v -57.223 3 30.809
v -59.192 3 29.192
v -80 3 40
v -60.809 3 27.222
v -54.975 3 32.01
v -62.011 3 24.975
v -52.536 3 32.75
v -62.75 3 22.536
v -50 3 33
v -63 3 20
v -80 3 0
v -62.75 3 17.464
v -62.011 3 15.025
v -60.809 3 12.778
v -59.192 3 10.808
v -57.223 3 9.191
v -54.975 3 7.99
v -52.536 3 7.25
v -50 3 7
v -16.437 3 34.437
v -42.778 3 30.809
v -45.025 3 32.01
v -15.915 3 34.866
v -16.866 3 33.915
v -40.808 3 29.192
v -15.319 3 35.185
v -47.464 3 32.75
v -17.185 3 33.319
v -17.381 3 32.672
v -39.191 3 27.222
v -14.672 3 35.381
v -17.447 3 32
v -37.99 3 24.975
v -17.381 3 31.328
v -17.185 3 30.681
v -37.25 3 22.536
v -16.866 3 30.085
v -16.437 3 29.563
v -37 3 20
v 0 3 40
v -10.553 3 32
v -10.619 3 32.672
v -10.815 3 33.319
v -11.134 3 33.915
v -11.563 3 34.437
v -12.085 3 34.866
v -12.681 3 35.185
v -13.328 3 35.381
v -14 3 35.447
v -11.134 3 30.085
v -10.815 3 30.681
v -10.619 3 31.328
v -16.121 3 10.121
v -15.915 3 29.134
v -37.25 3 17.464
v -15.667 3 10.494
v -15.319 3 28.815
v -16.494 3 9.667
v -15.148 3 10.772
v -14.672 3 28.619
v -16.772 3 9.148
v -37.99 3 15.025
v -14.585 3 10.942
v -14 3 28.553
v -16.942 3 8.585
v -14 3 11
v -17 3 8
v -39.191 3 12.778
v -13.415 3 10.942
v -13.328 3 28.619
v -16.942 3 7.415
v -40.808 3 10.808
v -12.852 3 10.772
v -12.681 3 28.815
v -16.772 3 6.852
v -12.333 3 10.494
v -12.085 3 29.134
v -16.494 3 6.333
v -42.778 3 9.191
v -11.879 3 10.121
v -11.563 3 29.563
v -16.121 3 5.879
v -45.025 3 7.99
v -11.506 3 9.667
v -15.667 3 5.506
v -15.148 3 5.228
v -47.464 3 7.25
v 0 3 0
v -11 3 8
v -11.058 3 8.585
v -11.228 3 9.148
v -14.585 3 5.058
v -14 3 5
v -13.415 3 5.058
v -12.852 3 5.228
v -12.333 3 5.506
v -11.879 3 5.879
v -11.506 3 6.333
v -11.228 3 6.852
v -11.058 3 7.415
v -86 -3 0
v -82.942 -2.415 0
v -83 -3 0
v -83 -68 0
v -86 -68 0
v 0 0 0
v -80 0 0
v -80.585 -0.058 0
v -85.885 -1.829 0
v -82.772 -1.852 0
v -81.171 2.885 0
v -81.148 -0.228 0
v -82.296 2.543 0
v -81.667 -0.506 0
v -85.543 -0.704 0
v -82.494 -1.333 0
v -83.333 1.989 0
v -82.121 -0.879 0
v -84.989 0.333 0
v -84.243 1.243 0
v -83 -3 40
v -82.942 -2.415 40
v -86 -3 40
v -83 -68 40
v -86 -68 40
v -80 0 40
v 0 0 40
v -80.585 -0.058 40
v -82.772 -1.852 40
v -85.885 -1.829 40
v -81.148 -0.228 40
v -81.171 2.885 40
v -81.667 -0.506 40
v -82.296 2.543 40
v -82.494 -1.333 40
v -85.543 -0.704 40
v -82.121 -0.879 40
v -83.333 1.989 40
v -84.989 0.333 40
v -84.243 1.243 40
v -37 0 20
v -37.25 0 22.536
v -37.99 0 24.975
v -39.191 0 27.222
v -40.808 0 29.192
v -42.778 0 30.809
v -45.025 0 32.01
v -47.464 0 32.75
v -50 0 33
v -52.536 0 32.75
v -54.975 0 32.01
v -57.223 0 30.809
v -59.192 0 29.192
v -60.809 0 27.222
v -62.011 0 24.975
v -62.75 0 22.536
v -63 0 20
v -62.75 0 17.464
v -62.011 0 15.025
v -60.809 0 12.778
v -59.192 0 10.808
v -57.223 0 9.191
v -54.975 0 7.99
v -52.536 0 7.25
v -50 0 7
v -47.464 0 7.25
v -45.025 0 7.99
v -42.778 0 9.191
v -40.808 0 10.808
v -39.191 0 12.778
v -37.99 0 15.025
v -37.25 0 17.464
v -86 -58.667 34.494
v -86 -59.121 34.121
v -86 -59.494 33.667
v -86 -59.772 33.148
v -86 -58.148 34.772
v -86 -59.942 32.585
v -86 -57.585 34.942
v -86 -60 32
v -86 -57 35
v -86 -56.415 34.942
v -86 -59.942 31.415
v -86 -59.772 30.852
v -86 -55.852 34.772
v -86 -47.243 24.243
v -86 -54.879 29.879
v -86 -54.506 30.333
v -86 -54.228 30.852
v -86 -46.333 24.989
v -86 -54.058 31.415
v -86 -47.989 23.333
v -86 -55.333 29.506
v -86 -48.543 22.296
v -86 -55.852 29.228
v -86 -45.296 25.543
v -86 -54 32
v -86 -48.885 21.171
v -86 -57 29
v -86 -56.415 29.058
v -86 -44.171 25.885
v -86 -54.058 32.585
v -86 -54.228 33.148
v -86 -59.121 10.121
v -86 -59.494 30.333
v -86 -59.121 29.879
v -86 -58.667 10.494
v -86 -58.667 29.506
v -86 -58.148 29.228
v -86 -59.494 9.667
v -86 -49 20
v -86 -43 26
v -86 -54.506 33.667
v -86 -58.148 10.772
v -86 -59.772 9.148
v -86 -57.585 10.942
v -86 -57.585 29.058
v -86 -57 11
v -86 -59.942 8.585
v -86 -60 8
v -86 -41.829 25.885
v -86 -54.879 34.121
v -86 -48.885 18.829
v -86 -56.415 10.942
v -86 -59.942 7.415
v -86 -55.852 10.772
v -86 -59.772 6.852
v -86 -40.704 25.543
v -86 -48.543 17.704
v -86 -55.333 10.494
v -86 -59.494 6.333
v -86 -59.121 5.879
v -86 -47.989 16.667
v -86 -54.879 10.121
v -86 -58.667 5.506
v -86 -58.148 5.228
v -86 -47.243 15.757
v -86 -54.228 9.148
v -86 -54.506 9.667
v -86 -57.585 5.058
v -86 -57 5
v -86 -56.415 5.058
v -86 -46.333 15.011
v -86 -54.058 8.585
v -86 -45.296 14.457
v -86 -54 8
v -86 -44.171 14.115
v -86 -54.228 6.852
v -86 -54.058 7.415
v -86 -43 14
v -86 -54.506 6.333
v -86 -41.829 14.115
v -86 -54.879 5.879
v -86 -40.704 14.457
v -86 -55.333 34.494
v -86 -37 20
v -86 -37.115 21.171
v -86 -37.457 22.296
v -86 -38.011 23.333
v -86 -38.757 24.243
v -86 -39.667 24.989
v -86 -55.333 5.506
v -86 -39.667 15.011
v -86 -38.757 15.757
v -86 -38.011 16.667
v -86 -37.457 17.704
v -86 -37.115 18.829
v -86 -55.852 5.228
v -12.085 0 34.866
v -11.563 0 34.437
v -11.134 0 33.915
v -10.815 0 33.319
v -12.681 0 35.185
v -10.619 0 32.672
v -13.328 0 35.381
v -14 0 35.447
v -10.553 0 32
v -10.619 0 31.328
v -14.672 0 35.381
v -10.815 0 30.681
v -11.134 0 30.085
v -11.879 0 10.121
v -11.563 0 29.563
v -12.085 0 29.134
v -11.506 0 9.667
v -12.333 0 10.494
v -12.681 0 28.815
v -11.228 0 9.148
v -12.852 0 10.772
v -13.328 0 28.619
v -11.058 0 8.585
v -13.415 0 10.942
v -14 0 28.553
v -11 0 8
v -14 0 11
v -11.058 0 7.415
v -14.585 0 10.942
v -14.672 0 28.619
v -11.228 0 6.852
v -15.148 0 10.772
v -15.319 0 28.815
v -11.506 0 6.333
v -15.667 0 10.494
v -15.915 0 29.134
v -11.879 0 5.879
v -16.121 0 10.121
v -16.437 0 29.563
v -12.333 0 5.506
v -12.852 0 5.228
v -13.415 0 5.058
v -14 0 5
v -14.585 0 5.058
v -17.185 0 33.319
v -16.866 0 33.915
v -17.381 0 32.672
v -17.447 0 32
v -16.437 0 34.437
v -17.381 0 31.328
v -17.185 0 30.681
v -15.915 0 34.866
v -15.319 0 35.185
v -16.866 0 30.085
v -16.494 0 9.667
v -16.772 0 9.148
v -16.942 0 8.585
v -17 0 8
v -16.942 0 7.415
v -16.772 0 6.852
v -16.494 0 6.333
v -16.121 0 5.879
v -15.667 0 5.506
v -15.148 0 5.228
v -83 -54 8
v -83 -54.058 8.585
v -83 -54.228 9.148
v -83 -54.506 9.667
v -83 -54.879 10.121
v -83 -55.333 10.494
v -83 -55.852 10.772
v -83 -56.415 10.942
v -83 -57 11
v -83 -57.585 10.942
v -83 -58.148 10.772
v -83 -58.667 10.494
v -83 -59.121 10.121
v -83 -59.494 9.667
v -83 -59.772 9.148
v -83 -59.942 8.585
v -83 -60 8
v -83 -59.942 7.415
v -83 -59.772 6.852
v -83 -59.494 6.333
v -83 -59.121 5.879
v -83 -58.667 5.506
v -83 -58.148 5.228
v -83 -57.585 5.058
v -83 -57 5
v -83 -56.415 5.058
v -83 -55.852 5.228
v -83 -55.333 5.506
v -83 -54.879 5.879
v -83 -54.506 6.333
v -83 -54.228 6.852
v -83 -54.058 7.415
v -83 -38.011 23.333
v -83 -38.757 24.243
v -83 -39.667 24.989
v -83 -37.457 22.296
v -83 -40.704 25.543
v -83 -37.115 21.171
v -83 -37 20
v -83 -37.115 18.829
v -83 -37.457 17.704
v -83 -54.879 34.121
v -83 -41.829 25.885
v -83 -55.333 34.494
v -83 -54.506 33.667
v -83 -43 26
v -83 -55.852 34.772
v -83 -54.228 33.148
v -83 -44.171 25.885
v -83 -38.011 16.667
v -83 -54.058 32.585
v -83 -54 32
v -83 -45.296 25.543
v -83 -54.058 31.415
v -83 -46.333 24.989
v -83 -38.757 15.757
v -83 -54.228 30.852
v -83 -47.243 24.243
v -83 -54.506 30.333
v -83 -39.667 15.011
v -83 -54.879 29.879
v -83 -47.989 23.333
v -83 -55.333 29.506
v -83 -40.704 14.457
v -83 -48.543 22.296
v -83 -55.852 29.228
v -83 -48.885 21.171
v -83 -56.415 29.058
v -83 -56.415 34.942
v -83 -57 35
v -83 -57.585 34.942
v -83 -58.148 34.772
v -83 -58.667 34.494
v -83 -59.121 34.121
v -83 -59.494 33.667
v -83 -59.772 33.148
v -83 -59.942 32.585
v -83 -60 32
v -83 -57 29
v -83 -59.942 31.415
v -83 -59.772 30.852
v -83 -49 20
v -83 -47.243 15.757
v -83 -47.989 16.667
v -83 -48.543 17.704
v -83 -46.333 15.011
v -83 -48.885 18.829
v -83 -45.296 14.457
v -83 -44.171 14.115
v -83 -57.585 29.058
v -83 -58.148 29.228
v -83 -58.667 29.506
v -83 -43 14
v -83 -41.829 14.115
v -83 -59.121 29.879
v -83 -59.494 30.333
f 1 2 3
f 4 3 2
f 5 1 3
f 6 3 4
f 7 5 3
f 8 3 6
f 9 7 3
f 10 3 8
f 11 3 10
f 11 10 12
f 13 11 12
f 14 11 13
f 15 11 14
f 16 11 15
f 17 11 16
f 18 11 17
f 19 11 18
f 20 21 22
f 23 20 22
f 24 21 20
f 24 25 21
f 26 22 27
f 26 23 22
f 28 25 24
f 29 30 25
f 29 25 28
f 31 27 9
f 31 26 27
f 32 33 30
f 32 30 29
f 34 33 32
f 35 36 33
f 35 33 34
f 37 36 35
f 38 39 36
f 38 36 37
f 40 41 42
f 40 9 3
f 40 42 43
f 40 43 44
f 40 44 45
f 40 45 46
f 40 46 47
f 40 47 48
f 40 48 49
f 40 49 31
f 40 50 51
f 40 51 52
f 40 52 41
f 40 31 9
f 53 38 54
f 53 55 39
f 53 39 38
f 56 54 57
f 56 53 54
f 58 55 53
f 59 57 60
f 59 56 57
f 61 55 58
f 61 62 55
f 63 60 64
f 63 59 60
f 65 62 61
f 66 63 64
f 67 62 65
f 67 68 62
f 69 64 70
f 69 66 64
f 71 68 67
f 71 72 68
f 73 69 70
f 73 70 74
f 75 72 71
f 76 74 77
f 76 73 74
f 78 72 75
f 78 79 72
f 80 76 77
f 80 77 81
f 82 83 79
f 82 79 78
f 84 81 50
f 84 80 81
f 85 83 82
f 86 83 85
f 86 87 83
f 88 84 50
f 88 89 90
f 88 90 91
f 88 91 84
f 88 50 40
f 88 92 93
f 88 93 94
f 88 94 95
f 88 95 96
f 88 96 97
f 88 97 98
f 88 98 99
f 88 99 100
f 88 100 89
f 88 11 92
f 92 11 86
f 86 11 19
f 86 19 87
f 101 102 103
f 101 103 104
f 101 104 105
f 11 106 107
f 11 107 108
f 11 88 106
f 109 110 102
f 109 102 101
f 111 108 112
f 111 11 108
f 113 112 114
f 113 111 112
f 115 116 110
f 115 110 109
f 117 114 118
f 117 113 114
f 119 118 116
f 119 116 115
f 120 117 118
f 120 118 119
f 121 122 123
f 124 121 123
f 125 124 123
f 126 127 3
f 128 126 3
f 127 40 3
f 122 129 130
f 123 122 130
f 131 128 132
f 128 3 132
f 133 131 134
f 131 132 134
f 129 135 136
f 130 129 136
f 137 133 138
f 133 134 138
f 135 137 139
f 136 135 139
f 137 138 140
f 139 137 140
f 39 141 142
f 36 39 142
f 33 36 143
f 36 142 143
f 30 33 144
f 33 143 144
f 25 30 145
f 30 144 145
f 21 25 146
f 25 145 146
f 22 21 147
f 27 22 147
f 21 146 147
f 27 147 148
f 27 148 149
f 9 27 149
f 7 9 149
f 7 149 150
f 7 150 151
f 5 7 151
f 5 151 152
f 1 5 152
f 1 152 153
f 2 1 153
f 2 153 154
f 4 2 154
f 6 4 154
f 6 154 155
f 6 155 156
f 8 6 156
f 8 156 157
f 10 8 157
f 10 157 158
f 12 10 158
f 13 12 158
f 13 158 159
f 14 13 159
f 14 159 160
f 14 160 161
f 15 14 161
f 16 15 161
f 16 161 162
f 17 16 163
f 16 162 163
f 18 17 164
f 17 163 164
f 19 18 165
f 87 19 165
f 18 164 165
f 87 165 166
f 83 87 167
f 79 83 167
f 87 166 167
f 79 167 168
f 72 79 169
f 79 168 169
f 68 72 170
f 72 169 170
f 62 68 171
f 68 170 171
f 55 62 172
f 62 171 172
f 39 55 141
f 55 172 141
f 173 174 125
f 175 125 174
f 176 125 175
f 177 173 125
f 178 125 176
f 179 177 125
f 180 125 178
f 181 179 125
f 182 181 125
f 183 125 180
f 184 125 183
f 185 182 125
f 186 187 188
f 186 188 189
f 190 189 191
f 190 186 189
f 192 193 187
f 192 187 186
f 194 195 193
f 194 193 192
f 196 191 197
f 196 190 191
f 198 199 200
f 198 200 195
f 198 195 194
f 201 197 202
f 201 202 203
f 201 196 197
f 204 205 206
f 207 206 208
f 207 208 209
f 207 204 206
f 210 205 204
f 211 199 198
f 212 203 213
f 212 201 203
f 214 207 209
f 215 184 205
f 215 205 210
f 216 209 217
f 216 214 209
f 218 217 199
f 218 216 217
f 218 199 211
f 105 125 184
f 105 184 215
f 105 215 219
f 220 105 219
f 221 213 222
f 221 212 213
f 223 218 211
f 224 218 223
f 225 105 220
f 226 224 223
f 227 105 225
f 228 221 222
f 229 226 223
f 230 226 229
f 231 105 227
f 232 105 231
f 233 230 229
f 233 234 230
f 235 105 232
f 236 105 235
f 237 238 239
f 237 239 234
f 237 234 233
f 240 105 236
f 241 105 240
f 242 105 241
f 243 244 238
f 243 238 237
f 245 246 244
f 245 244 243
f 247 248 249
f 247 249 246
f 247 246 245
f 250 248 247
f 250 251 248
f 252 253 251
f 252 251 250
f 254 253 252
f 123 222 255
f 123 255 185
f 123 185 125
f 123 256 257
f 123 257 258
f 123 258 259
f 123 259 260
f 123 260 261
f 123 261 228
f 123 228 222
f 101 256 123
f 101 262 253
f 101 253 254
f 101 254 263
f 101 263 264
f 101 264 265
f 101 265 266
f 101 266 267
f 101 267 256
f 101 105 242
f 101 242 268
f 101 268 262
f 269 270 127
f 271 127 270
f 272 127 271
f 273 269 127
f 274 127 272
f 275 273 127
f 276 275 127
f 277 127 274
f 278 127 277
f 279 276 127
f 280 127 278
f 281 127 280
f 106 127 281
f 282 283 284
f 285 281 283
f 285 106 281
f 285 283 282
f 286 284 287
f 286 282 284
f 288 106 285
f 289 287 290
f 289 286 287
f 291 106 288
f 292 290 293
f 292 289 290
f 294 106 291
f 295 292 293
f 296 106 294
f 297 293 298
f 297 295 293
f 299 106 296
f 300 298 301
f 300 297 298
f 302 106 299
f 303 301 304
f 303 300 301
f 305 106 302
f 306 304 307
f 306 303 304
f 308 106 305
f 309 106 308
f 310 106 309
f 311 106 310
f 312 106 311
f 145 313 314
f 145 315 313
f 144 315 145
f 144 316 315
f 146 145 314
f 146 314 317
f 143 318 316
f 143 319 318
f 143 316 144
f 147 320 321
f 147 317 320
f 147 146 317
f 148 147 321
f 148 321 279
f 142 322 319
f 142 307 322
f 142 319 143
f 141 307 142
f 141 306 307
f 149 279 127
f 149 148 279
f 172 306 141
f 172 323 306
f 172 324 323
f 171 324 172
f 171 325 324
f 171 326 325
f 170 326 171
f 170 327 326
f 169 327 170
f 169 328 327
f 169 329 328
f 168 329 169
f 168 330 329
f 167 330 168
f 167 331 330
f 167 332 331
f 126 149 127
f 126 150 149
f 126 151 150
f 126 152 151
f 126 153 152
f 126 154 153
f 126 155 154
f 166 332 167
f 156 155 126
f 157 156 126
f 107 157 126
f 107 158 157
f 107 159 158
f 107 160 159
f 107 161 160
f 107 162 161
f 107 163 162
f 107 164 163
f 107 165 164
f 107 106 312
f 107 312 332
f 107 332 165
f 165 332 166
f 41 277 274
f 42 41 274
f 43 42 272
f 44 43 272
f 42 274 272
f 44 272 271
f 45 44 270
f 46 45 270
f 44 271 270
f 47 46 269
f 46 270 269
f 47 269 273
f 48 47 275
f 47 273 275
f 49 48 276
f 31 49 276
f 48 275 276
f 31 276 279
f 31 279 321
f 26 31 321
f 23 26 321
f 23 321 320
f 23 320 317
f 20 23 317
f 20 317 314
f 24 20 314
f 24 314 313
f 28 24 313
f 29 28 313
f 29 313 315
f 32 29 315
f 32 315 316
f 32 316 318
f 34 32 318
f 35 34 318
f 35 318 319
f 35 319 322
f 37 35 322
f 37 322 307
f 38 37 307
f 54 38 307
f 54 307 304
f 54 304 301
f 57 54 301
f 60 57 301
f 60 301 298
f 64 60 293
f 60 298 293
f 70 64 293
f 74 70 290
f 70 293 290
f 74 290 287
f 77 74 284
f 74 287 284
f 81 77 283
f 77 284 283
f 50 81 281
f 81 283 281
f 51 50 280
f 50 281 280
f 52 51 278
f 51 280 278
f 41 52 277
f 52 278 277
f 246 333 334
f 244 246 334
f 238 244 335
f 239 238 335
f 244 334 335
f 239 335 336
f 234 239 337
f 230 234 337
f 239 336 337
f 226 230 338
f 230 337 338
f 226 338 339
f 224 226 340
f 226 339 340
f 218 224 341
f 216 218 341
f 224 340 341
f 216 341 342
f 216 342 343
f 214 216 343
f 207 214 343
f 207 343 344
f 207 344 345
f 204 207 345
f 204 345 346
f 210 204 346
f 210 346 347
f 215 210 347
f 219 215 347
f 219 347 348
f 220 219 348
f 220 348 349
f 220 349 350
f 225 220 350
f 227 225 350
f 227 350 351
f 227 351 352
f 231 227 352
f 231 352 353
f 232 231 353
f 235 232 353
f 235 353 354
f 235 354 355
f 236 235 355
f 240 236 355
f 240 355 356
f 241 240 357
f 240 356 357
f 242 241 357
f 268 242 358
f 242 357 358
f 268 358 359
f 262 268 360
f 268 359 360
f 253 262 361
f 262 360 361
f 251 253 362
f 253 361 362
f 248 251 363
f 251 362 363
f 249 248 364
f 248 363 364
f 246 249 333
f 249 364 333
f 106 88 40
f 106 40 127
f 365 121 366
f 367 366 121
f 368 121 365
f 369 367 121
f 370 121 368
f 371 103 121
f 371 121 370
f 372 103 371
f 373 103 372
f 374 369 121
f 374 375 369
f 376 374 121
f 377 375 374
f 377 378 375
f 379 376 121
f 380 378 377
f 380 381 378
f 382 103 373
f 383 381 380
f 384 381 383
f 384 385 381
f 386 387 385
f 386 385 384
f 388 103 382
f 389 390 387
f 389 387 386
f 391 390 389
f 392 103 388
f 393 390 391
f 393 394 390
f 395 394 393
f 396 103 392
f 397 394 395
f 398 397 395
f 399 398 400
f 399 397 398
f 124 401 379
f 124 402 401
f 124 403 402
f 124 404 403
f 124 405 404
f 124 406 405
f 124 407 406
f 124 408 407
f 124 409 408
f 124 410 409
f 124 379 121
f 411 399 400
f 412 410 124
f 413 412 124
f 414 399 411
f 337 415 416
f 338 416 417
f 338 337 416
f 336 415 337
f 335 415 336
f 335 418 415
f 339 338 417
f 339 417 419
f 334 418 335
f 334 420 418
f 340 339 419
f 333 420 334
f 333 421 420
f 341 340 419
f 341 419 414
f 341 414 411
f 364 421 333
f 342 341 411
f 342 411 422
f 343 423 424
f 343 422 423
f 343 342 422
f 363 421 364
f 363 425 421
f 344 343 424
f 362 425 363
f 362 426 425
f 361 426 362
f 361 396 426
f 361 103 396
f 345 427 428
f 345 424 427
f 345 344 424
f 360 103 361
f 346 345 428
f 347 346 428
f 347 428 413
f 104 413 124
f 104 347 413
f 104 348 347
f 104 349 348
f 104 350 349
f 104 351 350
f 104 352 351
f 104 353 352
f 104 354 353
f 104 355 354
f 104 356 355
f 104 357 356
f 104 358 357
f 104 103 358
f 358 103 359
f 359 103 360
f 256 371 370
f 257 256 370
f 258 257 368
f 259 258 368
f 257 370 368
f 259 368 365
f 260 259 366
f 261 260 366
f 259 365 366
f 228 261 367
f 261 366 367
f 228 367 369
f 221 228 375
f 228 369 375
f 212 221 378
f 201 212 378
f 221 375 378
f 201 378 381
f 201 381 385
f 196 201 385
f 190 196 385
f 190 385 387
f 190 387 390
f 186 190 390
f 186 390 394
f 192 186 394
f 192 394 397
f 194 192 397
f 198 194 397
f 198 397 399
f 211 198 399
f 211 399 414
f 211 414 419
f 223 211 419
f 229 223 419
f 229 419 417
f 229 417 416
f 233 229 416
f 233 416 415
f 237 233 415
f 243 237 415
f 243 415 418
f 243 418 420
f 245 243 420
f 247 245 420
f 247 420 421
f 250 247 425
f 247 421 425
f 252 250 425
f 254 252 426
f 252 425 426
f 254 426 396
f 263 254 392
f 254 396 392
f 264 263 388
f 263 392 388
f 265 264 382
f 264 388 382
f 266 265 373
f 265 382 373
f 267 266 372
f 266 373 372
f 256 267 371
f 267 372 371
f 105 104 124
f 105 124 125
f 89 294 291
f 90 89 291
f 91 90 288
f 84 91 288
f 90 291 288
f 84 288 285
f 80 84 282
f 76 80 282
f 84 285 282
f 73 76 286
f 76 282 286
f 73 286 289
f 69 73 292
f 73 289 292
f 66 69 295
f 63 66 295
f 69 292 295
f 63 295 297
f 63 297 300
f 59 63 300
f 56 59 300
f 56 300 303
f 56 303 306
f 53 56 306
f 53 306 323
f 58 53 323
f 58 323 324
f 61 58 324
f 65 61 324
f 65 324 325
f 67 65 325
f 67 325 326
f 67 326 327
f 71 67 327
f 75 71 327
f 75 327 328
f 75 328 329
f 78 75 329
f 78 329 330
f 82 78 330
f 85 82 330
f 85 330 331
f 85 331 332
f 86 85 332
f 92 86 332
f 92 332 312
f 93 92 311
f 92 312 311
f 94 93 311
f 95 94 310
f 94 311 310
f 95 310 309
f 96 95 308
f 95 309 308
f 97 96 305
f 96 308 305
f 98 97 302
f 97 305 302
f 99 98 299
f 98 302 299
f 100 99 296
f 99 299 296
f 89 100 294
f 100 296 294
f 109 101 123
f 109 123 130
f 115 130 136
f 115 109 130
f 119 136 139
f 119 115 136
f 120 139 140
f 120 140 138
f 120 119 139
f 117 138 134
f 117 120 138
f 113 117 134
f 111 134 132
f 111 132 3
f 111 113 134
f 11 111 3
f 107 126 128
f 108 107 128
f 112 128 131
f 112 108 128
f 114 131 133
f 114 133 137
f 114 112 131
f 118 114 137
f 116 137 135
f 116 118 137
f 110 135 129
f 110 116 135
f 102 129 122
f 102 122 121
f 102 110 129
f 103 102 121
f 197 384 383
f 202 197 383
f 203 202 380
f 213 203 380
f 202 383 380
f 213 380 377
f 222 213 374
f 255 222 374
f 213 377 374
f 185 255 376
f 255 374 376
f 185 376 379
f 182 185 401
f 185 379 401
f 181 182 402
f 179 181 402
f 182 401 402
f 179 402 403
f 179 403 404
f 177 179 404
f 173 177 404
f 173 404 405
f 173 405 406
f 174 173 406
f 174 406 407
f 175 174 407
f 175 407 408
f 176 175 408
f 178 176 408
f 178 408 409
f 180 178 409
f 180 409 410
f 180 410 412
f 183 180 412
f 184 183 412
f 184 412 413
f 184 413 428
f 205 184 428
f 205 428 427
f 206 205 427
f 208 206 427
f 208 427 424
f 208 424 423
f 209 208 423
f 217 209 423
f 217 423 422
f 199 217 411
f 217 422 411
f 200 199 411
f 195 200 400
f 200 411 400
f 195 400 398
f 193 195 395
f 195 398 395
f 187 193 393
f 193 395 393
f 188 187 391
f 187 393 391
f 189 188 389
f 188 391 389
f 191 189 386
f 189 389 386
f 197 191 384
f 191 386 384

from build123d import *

# Parameters (mm, degrees)
BASE_FLANGE1_DEPTH = 40
SKETCH2_R          = 6
CUT_EXTRUDE1_DEPTH = 115.512008104
SKETCH3_R          = 13
CUT_EXTRUDE2_DEPTH = 117.704755687
SKETCH4_R          = 3
CUT_EXTRUDE3_DEPTH = 10
SKETCH5_R          = 3
SKETCH5_R_2        = 3.446989576
CUT_EXTRUDE4_DEPTH = 10


# Sheet-metal steps are written as plain solids
with BuildPart() as part:
    # Sketch1 → Base-Flange1 (new body)
    with BuildSketch(Plane.XY):
        with BuildLine():
            Line((0, 0), (-80, 0))
            ThreePointArc((-80, 0), (-82.121320344, -0.878679656), (-83, -3))
            Line((-83, -3), (-83, -68))
            Line((-83, -68), (-86, -68))
            Line((-86, -68), (-86, -3))
            ThreePointArc((-86, -3), (-84.242640687, 1.242640687), (-80, 3))
            Line((-80, 3), (0, 3))
            Line((0, 3), (0, 0))
        make_face()
    extrude(amount=BASE_FLANGE1_DEPTH)

    # Sketch2 → Cut-Extrude1 (cut, through all)
    with BuildSketch(Plane(origin=(-83, 0, 0), x_dir=(0, 0, -1), z_dir=(1, 0, 0))):
        with Locations(Location((-20, -43, 0), (0, 0, 90))):
            Circle(SKETCH2_R)
    extrude(amount=-CUT_EXTRUDE1_DEPTH, mode=Mode.SUBTRACT)

    # Sketch3 → Cut-Extrude2 (cut, through all)
    with BuildSketch(Plane.XZ):
        with Locations((-50.000101558, 20)):
            Circle(SKETCH3_R)
    extrude(amount=-CUT_EXTRUDE2_DEPTH, mode=Mode.SUBTRACT)

    # Sketch4 → Cut-Extrude3 (cut)
    with BuildSketch(Plane(origin=(-83, 0, 0), x_dir=(0, 0, -1), z_dir=(1, 0, 0))):
        with Locations(Location((-8, -57, 0), (0, 0, 90))):
            Circle(SKETCH4_R)
        with Locations(Location((-32, -57, 0), (0, 0, 90))):
            Circle(SKETCH4_R)
    extrude(amount=-CUT_EXTRUDE3_DEPTH, mode=Mode.SUBTRACT)

    # Sketch5 → Cut-Extrude4 (cut)
    with BuildSketch(Plane.XZ):
        with Locations((-14, 8)):
            Circle(SKETCH5_R)
        with Locations((-14, 32)):
            Circle(SKETCH5_R_2)
    extrude(amount=-CUT_EXTRUDE4_DEPTH, mode=Mode.SUBTRACT)


solid = part.part
